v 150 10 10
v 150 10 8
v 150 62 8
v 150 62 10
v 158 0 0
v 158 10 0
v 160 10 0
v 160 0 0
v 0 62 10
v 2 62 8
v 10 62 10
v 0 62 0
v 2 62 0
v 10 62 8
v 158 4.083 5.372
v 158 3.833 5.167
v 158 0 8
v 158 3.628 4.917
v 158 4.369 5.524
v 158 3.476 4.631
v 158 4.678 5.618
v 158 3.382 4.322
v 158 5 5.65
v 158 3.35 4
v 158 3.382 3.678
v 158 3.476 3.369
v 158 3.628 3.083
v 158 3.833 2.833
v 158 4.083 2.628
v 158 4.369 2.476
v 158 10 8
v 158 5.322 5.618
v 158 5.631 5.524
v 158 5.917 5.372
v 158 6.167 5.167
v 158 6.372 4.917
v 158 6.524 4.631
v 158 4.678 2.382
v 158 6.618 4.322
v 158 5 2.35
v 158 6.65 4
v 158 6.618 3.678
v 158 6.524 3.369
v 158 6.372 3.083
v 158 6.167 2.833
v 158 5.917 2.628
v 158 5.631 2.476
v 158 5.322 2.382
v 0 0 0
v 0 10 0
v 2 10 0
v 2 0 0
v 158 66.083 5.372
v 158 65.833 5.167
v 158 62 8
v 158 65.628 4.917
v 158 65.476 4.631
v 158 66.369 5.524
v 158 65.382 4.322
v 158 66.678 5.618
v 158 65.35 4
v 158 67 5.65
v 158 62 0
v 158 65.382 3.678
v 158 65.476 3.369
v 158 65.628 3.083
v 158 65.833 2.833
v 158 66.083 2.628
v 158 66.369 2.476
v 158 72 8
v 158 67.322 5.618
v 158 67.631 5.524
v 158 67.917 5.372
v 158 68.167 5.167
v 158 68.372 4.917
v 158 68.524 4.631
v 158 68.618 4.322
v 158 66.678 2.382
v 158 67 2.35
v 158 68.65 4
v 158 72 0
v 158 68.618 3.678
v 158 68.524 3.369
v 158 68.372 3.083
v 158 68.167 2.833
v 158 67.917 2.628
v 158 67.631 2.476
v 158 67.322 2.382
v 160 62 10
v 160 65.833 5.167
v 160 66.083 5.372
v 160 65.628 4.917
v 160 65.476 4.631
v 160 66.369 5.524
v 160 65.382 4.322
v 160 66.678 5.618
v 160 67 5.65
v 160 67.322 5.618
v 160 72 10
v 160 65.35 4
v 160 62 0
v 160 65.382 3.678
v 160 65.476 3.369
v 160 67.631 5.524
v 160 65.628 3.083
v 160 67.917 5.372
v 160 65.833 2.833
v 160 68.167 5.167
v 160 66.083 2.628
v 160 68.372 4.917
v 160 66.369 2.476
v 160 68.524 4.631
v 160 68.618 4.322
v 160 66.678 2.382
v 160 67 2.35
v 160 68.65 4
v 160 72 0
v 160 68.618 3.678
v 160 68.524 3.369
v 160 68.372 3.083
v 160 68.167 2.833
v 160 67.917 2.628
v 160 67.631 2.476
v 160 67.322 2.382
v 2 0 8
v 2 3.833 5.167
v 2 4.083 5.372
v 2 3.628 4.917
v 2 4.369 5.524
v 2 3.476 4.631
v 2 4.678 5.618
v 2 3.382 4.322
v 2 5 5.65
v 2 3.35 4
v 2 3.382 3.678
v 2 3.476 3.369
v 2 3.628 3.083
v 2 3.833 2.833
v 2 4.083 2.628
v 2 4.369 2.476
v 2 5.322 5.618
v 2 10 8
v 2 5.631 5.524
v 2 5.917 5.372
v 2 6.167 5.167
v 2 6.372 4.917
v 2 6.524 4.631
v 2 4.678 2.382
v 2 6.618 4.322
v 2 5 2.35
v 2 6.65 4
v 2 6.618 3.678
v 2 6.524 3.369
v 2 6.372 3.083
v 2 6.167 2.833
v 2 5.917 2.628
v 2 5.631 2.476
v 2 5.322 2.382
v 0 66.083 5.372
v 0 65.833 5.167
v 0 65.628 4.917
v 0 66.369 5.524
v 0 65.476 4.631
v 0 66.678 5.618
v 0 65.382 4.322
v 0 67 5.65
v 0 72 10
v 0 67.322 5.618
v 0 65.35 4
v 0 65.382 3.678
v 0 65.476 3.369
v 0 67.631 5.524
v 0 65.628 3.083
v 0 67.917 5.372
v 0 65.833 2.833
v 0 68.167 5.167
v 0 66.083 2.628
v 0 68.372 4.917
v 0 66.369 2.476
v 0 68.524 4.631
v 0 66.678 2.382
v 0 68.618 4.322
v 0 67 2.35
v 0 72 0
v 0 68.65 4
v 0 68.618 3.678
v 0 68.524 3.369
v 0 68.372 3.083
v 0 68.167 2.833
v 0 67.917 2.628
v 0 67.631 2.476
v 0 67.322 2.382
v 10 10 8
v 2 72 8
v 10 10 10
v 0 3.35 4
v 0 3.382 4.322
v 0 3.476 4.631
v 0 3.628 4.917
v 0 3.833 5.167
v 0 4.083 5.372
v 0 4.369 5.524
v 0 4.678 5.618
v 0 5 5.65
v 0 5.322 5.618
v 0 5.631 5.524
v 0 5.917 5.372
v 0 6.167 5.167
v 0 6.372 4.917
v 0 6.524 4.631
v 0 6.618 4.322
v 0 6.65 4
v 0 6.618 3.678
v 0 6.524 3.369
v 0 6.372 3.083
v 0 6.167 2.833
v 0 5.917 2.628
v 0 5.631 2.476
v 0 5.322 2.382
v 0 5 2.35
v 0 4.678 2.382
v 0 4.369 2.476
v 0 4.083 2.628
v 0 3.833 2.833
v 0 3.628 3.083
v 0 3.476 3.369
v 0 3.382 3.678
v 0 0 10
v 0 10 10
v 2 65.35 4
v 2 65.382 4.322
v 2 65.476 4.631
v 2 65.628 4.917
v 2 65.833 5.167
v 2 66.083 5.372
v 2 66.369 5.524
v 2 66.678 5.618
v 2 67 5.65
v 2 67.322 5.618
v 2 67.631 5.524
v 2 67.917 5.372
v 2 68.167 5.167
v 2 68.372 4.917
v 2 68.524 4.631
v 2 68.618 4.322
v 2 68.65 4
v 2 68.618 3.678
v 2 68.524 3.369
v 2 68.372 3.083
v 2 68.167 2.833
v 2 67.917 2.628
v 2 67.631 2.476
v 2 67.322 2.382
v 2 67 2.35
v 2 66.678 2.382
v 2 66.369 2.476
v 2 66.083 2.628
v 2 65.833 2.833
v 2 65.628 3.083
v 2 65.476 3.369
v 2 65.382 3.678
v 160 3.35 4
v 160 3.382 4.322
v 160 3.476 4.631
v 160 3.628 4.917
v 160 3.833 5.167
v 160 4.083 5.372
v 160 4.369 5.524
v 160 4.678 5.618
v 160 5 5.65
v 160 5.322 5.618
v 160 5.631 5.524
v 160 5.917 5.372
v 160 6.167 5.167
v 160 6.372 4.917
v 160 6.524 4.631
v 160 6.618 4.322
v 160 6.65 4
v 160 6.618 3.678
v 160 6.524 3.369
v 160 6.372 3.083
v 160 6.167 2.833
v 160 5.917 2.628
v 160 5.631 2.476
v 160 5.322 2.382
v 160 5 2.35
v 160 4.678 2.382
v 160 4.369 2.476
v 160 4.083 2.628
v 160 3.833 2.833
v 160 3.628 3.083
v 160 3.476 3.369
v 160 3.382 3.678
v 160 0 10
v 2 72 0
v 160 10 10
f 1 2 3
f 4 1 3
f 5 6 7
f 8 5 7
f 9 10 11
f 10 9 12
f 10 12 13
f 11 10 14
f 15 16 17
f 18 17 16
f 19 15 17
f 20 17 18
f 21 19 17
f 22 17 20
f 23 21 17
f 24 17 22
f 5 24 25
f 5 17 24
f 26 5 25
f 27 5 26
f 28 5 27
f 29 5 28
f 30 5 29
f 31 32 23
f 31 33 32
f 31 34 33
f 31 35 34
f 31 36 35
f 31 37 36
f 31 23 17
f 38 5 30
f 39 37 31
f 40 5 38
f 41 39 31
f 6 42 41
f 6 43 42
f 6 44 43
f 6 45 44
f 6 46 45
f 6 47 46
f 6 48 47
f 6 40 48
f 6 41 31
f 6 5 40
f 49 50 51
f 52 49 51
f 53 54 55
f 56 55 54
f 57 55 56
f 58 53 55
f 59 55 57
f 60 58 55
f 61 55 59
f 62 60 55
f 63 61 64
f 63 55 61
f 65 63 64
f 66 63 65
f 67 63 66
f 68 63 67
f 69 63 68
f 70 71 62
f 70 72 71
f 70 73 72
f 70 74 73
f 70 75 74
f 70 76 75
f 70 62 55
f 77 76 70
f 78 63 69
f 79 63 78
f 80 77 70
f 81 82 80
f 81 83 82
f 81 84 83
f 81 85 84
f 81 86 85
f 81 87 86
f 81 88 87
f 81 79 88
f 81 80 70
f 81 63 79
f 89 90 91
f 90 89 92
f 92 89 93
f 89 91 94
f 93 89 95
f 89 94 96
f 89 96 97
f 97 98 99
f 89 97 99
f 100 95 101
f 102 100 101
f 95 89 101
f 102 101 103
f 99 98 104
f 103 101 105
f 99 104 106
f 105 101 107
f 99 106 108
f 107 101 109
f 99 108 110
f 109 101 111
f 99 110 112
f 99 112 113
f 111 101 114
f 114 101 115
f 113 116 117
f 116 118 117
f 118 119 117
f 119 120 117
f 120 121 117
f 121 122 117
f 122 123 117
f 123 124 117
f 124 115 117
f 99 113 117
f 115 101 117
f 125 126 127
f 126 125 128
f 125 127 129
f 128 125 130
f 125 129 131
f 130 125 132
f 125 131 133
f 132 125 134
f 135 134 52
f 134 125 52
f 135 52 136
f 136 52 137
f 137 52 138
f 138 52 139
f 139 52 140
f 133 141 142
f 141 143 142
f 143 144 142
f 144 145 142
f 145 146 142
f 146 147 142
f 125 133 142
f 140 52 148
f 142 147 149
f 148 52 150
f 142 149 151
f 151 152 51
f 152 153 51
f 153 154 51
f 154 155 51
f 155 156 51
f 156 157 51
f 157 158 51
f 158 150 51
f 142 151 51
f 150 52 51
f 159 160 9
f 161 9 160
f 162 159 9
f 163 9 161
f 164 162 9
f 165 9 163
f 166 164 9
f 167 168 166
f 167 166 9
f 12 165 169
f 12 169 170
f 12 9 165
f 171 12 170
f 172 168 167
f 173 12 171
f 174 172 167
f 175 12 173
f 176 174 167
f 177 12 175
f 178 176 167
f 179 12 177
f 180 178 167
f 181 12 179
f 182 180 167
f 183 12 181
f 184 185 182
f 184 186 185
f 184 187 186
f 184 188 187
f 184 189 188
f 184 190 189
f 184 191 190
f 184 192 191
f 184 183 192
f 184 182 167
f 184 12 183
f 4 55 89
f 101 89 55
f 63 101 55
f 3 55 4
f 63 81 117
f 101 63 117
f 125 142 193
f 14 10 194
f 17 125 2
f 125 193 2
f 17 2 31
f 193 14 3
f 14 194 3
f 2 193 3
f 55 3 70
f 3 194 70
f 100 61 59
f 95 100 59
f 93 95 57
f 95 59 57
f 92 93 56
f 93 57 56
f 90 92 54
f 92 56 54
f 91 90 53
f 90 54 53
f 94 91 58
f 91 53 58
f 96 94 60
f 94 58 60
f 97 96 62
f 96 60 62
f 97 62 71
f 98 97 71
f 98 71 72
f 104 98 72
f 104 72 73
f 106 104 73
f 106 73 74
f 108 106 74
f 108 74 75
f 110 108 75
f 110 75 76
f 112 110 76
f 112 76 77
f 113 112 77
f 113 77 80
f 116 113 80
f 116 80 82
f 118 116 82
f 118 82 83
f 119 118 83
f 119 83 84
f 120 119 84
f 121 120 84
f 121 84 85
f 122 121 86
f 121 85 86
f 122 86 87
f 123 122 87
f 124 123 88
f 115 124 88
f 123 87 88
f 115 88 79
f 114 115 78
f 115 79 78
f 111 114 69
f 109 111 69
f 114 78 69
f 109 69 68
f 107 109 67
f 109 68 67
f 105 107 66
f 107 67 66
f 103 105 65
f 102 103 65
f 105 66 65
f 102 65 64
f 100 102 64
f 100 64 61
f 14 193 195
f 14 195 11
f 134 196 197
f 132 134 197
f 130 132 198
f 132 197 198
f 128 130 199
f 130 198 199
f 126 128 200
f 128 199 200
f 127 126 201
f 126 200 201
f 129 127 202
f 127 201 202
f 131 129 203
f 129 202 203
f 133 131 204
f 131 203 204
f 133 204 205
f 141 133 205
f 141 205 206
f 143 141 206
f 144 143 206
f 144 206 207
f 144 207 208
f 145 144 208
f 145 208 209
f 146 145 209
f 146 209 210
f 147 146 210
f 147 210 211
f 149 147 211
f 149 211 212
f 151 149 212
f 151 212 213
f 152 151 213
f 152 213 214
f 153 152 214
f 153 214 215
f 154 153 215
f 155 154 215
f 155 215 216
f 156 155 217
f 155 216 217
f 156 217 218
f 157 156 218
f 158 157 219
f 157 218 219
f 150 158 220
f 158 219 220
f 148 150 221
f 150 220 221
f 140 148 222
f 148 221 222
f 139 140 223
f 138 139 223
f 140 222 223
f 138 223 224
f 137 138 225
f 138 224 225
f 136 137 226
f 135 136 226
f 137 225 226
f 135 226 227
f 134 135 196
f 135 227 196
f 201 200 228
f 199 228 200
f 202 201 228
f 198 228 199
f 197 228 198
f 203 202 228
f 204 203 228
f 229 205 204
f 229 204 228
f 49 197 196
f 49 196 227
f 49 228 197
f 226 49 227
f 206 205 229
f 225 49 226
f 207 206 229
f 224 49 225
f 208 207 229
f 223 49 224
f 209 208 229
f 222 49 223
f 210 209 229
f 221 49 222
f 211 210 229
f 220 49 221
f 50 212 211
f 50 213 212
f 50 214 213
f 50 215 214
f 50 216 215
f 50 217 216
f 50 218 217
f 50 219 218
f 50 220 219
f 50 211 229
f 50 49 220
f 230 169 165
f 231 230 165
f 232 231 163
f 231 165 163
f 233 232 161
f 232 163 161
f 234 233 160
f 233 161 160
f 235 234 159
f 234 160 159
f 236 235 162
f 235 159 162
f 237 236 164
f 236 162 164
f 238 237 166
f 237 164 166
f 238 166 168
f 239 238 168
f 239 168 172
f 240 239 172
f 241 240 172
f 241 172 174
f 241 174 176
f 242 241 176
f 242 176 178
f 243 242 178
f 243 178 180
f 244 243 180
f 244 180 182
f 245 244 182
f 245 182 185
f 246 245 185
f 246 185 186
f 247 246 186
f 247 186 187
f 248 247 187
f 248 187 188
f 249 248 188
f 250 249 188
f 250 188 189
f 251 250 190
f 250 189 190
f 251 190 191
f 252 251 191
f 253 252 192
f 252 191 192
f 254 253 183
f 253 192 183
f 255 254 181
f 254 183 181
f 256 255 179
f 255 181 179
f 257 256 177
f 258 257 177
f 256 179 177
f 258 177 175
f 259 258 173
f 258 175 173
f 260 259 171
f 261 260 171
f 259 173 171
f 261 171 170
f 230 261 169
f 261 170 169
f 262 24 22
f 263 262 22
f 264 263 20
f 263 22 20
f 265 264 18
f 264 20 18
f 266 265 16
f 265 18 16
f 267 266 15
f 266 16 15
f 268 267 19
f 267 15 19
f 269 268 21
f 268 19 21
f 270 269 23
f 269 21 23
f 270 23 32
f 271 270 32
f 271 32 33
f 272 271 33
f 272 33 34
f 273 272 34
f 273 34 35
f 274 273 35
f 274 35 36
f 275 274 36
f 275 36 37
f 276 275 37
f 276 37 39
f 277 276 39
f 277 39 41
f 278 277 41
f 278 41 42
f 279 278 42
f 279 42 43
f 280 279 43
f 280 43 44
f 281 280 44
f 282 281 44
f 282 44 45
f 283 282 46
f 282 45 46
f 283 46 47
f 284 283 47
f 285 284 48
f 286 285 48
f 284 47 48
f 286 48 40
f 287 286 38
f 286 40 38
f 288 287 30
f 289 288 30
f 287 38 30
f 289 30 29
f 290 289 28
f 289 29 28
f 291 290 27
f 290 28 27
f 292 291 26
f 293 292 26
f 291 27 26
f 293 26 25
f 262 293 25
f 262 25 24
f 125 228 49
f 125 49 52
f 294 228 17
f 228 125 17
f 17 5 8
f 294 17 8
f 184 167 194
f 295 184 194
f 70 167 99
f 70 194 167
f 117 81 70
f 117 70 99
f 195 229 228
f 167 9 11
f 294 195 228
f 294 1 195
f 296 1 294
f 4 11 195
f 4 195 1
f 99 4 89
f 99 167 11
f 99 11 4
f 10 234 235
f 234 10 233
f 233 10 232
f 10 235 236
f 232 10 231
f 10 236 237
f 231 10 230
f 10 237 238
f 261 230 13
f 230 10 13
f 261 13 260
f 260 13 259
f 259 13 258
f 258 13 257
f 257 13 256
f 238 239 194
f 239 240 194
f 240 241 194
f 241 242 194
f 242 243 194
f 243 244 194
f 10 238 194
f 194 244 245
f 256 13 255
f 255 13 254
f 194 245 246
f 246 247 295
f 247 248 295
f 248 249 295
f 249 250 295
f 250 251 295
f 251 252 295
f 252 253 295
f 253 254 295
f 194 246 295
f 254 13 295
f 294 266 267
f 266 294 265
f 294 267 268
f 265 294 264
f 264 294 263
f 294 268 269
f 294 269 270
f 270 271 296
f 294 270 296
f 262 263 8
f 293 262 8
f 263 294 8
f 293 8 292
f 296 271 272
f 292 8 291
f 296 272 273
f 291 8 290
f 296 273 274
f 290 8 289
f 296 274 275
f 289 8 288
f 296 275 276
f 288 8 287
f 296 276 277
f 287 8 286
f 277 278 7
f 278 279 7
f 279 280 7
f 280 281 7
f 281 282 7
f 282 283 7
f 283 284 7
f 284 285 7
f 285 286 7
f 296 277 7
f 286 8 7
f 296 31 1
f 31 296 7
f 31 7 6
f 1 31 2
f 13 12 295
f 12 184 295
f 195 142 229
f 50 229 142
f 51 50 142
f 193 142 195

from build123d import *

# Parameters (mm, degrees)
BOX002_W     = 156
BOX002_H     = 72
BOX002_DEPTH = 8
BOX001_W     = 10
BOX001_H     = 52
BOX001_DEPTH = 10
BOX_W        = 160
BOX_H        = 72
BOX_DEPTH    = 10
SKETCH_R     = 1.65
HOLE_DEPTH   = 160.001


with BuildPart() as w_rfel002:
    # Box002 → Box002 (new body)
    with BuildSketch(Plane(origin=(2, 0, 0), x_dir=(1, 0, 0), z_dir=(0, 0, 1))):
        with Locations((78, 36)):
            Rectangle(BOX002_W, BOX002_H)
    extrude(amount=BOX002_DEPTH)


with BuildPart() as w_rfel001:
    # Box001 → Box001 (new body)
    with BuildSketch(Plane(origin=(0, 10, 0), x_dir=(1, 0, 0), z_dir=(0, 0, 1))):
        with Locations((5, 26)):
            Rectangle(BOX001_W, BOX001_H)
    extrude(amount=BOX001_DEPTH)


with BuildPart() as part_mirroring:
    # Part__Mirroring: instance of Würfel001
    add(w_rfel001.part.mirror(Plane(origin=(80, 0, 0), x_dir=(0, -1, 0), z_dir=(1, 0, 0))))


with BuildPart() as body:
    # Box → Box (new body)
    with BuildSketch(Plane.XY):
        with Locations((80, 36)):
            Rectangle(BOX_W, BOX_H)
    extrude(amount=BOX_DEPTH)

    # Cut: cut Würfel001
    add(w_rfel001.part, mode=Mode.SUBTRACT)

    # Cut001: cut Part__Mirroring
    add(part_mirroring.part, mode=Mode.SUBTRACT)

    # Cut002: cut Würfel002
    add(w_rfel002.part, mode=Mode.SUBTRACT)

    # Sketch (on Face1 of BaseFeature) → Hole (cut, through all)
    with BuildSketch(Plane(origin=(0, 0, 0), x_dir=(0, -1, 0), z_dir=(-1, 0, 0))):
        with Locations((-5, 4)):
            Circle(SKETCH_R)
        with Locations((-67, 4)):
            Circle(SKETCH_R)
    extrude(amount=-HOLE_DEPTH, mode=Mode.SUBTRACT)


solid = body.part
